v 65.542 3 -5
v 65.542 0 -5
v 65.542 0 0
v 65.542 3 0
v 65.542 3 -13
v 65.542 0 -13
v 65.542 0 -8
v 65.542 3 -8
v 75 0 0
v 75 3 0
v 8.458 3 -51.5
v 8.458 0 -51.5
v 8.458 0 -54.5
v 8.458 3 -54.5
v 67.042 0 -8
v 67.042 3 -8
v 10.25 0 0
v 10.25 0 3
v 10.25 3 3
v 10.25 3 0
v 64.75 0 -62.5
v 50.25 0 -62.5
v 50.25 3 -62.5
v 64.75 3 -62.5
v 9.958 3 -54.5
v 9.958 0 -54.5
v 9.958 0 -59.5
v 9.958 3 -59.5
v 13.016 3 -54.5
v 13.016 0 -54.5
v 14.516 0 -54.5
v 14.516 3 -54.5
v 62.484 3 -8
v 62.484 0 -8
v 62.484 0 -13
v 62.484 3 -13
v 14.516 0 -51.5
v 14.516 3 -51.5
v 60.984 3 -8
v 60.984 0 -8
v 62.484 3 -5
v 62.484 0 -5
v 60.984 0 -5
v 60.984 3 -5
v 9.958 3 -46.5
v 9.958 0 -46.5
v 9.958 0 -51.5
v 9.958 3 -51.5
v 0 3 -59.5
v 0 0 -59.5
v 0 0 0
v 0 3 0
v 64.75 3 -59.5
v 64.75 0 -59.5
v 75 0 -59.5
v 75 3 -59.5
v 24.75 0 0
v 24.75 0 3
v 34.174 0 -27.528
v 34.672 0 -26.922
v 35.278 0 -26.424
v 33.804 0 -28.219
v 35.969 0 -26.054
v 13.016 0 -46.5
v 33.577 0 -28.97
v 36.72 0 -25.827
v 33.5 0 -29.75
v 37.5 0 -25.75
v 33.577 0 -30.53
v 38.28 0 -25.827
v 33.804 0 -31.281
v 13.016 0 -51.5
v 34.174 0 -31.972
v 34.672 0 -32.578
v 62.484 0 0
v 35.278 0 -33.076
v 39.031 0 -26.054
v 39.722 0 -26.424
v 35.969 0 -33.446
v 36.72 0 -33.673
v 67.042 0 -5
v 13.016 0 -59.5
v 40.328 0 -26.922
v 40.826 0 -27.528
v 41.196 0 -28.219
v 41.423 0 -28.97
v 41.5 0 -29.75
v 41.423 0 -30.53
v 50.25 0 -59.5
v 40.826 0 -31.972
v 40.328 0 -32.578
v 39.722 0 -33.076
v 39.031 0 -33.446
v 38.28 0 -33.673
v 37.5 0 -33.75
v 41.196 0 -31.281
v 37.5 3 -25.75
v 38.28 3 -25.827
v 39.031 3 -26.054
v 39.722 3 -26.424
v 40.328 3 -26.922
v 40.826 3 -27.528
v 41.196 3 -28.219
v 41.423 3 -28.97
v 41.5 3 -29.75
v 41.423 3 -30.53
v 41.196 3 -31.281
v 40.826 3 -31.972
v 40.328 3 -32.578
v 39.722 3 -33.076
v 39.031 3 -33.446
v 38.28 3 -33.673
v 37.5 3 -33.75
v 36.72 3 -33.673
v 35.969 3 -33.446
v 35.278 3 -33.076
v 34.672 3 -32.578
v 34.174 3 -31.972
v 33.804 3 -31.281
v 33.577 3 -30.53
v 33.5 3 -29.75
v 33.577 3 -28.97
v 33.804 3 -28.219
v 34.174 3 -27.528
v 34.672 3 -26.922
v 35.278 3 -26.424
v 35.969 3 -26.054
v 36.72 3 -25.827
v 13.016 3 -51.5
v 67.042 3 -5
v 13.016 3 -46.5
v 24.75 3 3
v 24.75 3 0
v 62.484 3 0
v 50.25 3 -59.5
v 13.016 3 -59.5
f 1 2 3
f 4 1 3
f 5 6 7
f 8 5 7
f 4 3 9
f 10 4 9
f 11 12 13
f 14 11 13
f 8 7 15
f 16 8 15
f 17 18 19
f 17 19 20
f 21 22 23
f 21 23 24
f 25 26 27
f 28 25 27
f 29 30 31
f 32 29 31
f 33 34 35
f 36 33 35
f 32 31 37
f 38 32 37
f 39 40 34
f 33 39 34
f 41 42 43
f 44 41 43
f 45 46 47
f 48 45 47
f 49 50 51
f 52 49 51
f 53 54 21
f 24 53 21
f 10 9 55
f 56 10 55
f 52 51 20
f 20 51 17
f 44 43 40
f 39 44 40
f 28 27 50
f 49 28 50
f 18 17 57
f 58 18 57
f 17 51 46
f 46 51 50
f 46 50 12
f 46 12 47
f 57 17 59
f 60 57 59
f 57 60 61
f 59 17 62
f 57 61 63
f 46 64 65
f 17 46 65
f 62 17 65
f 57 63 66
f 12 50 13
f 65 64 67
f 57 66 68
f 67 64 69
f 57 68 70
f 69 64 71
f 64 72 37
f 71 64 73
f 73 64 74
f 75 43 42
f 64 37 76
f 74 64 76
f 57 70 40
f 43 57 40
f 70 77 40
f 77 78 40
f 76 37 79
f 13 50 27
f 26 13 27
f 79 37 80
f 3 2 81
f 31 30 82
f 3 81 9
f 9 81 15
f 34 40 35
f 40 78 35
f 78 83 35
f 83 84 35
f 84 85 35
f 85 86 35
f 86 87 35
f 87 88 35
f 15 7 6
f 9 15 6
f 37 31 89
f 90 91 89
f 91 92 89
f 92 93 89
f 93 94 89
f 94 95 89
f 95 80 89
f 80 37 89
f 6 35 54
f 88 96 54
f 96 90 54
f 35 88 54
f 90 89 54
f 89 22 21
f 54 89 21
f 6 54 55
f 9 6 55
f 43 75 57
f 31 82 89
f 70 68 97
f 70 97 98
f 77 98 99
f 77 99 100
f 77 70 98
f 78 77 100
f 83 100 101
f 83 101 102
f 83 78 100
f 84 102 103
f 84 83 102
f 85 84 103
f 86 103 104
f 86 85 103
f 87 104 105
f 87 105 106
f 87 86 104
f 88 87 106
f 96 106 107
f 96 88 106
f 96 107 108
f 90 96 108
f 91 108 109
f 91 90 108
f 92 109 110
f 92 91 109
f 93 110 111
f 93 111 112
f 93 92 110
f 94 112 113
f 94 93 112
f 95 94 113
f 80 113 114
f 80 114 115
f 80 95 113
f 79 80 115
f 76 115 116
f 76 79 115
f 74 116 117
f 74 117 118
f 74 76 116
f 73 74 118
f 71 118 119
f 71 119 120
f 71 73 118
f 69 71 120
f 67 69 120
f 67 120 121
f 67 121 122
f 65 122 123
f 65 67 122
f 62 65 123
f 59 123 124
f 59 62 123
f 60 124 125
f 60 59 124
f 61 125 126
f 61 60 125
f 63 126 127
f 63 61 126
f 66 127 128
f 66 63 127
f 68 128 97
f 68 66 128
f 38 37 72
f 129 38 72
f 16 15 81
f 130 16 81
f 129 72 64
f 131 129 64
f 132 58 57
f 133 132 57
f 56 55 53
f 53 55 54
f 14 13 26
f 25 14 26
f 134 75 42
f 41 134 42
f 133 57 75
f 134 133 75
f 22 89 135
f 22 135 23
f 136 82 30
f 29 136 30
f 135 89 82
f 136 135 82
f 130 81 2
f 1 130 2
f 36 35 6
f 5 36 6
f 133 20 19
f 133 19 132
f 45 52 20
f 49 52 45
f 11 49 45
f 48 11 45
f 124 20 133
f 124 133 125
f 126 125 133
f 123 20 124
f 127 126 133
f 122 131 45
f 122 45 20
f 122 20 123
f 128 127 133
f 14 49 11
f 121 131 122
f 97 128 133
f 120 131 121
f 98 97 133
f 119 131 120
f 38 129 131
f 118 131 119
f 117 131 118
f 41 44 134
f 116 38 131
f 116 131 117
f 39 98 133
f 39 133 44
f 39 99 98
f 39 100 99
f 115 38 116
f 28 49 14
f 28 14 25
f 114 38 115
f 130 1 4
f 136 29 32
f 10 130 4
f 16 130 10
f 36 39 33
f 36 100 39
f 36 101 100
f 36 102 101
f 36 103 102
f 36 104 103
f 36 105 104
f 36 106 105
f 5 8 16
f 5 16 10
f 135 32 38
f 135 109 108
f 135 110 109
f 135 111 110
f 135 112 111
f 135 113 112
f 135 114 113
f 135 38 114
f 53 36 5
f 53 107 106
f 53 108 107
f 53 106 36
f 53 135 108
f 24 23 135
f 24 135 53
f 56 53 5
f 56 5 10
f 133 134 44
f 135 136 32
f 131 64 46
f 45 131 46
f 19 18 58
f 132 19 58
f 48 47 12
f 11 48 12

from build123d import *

# Parameters (mm, degrees)
ESQUISSE3_W        = 14.5
ESQUISSE3_H        = 3
ESQUISSE3_R        = 4
BOSS_EXTRU_1_DEPTH = 3


with BuildPart() as part:
    # Esquisse3 → Boss.-Extru.1 (new body)
    # profile 1 of 3: a face of its own
    with BuildSketch(Plane(origin=(0, 0, 0), x_dir=(1, 0, 0), z_dir=(0, 1, 0))):
        with Locations((17.5, -1.5)):
            Rectangle(ESQUISSE3_W, ESQUISSE3_H)
    # profile 2 of 3: a face of its own
    with BuildSketch(Plane(origin=(0, 0, 0), x_dir=(1, 0, 0), z_dir=(0, 1, 0))):
        Polygon((0, 59.5), (0, 0), (10.25, 0), (24.75, 0), (62.484051244, 0), (62.484051244, 5), (60.984051244, 5), (60.984051244, 8), (62.484051244, 8), (62.484051244, 13), (65.541555924, 13), (65.541555924, 8), (67.041555924, 8), (67.041555924, 5), (65.541555924, 5), (65.541555924, 0), (75, 0), (75, 59.5), (64.75, 59.5), (50.25, 59.5), (13.015948756, 59.5), (13.015948756, 54.5), (14.515948756, 54.5), (14.515948756, 51.5), (13.015948756, 51.5), (13.015948756, 46.5), (9.958444076, 46.5), (9.958444076, 51.5), (8.458444076, 51.5), (8.458444076, 54.5), (9.958444076, 54.5), (9.958444076, 59.5), align=None)
        with Locations(Location((37.5, 29.75, 0), (0, 0, 270))):
            Circle(ESQUISSE3_R, mode=Mode.SUBTRACT)
    # profile 3 of 3: a face of its own
    with BuildSketch(Plane(origin=(0, 0, 0), x_dir=(1, 0, 0), z_dir=(0, 1, 0))):
        with Locations((57.5, 61)):
            Rectangle(ESQUISSE3_W, ESQUISSE3_H)
    extrude(amount=BOSS_EXTRU_1_DEPTH)


solid = part.part
